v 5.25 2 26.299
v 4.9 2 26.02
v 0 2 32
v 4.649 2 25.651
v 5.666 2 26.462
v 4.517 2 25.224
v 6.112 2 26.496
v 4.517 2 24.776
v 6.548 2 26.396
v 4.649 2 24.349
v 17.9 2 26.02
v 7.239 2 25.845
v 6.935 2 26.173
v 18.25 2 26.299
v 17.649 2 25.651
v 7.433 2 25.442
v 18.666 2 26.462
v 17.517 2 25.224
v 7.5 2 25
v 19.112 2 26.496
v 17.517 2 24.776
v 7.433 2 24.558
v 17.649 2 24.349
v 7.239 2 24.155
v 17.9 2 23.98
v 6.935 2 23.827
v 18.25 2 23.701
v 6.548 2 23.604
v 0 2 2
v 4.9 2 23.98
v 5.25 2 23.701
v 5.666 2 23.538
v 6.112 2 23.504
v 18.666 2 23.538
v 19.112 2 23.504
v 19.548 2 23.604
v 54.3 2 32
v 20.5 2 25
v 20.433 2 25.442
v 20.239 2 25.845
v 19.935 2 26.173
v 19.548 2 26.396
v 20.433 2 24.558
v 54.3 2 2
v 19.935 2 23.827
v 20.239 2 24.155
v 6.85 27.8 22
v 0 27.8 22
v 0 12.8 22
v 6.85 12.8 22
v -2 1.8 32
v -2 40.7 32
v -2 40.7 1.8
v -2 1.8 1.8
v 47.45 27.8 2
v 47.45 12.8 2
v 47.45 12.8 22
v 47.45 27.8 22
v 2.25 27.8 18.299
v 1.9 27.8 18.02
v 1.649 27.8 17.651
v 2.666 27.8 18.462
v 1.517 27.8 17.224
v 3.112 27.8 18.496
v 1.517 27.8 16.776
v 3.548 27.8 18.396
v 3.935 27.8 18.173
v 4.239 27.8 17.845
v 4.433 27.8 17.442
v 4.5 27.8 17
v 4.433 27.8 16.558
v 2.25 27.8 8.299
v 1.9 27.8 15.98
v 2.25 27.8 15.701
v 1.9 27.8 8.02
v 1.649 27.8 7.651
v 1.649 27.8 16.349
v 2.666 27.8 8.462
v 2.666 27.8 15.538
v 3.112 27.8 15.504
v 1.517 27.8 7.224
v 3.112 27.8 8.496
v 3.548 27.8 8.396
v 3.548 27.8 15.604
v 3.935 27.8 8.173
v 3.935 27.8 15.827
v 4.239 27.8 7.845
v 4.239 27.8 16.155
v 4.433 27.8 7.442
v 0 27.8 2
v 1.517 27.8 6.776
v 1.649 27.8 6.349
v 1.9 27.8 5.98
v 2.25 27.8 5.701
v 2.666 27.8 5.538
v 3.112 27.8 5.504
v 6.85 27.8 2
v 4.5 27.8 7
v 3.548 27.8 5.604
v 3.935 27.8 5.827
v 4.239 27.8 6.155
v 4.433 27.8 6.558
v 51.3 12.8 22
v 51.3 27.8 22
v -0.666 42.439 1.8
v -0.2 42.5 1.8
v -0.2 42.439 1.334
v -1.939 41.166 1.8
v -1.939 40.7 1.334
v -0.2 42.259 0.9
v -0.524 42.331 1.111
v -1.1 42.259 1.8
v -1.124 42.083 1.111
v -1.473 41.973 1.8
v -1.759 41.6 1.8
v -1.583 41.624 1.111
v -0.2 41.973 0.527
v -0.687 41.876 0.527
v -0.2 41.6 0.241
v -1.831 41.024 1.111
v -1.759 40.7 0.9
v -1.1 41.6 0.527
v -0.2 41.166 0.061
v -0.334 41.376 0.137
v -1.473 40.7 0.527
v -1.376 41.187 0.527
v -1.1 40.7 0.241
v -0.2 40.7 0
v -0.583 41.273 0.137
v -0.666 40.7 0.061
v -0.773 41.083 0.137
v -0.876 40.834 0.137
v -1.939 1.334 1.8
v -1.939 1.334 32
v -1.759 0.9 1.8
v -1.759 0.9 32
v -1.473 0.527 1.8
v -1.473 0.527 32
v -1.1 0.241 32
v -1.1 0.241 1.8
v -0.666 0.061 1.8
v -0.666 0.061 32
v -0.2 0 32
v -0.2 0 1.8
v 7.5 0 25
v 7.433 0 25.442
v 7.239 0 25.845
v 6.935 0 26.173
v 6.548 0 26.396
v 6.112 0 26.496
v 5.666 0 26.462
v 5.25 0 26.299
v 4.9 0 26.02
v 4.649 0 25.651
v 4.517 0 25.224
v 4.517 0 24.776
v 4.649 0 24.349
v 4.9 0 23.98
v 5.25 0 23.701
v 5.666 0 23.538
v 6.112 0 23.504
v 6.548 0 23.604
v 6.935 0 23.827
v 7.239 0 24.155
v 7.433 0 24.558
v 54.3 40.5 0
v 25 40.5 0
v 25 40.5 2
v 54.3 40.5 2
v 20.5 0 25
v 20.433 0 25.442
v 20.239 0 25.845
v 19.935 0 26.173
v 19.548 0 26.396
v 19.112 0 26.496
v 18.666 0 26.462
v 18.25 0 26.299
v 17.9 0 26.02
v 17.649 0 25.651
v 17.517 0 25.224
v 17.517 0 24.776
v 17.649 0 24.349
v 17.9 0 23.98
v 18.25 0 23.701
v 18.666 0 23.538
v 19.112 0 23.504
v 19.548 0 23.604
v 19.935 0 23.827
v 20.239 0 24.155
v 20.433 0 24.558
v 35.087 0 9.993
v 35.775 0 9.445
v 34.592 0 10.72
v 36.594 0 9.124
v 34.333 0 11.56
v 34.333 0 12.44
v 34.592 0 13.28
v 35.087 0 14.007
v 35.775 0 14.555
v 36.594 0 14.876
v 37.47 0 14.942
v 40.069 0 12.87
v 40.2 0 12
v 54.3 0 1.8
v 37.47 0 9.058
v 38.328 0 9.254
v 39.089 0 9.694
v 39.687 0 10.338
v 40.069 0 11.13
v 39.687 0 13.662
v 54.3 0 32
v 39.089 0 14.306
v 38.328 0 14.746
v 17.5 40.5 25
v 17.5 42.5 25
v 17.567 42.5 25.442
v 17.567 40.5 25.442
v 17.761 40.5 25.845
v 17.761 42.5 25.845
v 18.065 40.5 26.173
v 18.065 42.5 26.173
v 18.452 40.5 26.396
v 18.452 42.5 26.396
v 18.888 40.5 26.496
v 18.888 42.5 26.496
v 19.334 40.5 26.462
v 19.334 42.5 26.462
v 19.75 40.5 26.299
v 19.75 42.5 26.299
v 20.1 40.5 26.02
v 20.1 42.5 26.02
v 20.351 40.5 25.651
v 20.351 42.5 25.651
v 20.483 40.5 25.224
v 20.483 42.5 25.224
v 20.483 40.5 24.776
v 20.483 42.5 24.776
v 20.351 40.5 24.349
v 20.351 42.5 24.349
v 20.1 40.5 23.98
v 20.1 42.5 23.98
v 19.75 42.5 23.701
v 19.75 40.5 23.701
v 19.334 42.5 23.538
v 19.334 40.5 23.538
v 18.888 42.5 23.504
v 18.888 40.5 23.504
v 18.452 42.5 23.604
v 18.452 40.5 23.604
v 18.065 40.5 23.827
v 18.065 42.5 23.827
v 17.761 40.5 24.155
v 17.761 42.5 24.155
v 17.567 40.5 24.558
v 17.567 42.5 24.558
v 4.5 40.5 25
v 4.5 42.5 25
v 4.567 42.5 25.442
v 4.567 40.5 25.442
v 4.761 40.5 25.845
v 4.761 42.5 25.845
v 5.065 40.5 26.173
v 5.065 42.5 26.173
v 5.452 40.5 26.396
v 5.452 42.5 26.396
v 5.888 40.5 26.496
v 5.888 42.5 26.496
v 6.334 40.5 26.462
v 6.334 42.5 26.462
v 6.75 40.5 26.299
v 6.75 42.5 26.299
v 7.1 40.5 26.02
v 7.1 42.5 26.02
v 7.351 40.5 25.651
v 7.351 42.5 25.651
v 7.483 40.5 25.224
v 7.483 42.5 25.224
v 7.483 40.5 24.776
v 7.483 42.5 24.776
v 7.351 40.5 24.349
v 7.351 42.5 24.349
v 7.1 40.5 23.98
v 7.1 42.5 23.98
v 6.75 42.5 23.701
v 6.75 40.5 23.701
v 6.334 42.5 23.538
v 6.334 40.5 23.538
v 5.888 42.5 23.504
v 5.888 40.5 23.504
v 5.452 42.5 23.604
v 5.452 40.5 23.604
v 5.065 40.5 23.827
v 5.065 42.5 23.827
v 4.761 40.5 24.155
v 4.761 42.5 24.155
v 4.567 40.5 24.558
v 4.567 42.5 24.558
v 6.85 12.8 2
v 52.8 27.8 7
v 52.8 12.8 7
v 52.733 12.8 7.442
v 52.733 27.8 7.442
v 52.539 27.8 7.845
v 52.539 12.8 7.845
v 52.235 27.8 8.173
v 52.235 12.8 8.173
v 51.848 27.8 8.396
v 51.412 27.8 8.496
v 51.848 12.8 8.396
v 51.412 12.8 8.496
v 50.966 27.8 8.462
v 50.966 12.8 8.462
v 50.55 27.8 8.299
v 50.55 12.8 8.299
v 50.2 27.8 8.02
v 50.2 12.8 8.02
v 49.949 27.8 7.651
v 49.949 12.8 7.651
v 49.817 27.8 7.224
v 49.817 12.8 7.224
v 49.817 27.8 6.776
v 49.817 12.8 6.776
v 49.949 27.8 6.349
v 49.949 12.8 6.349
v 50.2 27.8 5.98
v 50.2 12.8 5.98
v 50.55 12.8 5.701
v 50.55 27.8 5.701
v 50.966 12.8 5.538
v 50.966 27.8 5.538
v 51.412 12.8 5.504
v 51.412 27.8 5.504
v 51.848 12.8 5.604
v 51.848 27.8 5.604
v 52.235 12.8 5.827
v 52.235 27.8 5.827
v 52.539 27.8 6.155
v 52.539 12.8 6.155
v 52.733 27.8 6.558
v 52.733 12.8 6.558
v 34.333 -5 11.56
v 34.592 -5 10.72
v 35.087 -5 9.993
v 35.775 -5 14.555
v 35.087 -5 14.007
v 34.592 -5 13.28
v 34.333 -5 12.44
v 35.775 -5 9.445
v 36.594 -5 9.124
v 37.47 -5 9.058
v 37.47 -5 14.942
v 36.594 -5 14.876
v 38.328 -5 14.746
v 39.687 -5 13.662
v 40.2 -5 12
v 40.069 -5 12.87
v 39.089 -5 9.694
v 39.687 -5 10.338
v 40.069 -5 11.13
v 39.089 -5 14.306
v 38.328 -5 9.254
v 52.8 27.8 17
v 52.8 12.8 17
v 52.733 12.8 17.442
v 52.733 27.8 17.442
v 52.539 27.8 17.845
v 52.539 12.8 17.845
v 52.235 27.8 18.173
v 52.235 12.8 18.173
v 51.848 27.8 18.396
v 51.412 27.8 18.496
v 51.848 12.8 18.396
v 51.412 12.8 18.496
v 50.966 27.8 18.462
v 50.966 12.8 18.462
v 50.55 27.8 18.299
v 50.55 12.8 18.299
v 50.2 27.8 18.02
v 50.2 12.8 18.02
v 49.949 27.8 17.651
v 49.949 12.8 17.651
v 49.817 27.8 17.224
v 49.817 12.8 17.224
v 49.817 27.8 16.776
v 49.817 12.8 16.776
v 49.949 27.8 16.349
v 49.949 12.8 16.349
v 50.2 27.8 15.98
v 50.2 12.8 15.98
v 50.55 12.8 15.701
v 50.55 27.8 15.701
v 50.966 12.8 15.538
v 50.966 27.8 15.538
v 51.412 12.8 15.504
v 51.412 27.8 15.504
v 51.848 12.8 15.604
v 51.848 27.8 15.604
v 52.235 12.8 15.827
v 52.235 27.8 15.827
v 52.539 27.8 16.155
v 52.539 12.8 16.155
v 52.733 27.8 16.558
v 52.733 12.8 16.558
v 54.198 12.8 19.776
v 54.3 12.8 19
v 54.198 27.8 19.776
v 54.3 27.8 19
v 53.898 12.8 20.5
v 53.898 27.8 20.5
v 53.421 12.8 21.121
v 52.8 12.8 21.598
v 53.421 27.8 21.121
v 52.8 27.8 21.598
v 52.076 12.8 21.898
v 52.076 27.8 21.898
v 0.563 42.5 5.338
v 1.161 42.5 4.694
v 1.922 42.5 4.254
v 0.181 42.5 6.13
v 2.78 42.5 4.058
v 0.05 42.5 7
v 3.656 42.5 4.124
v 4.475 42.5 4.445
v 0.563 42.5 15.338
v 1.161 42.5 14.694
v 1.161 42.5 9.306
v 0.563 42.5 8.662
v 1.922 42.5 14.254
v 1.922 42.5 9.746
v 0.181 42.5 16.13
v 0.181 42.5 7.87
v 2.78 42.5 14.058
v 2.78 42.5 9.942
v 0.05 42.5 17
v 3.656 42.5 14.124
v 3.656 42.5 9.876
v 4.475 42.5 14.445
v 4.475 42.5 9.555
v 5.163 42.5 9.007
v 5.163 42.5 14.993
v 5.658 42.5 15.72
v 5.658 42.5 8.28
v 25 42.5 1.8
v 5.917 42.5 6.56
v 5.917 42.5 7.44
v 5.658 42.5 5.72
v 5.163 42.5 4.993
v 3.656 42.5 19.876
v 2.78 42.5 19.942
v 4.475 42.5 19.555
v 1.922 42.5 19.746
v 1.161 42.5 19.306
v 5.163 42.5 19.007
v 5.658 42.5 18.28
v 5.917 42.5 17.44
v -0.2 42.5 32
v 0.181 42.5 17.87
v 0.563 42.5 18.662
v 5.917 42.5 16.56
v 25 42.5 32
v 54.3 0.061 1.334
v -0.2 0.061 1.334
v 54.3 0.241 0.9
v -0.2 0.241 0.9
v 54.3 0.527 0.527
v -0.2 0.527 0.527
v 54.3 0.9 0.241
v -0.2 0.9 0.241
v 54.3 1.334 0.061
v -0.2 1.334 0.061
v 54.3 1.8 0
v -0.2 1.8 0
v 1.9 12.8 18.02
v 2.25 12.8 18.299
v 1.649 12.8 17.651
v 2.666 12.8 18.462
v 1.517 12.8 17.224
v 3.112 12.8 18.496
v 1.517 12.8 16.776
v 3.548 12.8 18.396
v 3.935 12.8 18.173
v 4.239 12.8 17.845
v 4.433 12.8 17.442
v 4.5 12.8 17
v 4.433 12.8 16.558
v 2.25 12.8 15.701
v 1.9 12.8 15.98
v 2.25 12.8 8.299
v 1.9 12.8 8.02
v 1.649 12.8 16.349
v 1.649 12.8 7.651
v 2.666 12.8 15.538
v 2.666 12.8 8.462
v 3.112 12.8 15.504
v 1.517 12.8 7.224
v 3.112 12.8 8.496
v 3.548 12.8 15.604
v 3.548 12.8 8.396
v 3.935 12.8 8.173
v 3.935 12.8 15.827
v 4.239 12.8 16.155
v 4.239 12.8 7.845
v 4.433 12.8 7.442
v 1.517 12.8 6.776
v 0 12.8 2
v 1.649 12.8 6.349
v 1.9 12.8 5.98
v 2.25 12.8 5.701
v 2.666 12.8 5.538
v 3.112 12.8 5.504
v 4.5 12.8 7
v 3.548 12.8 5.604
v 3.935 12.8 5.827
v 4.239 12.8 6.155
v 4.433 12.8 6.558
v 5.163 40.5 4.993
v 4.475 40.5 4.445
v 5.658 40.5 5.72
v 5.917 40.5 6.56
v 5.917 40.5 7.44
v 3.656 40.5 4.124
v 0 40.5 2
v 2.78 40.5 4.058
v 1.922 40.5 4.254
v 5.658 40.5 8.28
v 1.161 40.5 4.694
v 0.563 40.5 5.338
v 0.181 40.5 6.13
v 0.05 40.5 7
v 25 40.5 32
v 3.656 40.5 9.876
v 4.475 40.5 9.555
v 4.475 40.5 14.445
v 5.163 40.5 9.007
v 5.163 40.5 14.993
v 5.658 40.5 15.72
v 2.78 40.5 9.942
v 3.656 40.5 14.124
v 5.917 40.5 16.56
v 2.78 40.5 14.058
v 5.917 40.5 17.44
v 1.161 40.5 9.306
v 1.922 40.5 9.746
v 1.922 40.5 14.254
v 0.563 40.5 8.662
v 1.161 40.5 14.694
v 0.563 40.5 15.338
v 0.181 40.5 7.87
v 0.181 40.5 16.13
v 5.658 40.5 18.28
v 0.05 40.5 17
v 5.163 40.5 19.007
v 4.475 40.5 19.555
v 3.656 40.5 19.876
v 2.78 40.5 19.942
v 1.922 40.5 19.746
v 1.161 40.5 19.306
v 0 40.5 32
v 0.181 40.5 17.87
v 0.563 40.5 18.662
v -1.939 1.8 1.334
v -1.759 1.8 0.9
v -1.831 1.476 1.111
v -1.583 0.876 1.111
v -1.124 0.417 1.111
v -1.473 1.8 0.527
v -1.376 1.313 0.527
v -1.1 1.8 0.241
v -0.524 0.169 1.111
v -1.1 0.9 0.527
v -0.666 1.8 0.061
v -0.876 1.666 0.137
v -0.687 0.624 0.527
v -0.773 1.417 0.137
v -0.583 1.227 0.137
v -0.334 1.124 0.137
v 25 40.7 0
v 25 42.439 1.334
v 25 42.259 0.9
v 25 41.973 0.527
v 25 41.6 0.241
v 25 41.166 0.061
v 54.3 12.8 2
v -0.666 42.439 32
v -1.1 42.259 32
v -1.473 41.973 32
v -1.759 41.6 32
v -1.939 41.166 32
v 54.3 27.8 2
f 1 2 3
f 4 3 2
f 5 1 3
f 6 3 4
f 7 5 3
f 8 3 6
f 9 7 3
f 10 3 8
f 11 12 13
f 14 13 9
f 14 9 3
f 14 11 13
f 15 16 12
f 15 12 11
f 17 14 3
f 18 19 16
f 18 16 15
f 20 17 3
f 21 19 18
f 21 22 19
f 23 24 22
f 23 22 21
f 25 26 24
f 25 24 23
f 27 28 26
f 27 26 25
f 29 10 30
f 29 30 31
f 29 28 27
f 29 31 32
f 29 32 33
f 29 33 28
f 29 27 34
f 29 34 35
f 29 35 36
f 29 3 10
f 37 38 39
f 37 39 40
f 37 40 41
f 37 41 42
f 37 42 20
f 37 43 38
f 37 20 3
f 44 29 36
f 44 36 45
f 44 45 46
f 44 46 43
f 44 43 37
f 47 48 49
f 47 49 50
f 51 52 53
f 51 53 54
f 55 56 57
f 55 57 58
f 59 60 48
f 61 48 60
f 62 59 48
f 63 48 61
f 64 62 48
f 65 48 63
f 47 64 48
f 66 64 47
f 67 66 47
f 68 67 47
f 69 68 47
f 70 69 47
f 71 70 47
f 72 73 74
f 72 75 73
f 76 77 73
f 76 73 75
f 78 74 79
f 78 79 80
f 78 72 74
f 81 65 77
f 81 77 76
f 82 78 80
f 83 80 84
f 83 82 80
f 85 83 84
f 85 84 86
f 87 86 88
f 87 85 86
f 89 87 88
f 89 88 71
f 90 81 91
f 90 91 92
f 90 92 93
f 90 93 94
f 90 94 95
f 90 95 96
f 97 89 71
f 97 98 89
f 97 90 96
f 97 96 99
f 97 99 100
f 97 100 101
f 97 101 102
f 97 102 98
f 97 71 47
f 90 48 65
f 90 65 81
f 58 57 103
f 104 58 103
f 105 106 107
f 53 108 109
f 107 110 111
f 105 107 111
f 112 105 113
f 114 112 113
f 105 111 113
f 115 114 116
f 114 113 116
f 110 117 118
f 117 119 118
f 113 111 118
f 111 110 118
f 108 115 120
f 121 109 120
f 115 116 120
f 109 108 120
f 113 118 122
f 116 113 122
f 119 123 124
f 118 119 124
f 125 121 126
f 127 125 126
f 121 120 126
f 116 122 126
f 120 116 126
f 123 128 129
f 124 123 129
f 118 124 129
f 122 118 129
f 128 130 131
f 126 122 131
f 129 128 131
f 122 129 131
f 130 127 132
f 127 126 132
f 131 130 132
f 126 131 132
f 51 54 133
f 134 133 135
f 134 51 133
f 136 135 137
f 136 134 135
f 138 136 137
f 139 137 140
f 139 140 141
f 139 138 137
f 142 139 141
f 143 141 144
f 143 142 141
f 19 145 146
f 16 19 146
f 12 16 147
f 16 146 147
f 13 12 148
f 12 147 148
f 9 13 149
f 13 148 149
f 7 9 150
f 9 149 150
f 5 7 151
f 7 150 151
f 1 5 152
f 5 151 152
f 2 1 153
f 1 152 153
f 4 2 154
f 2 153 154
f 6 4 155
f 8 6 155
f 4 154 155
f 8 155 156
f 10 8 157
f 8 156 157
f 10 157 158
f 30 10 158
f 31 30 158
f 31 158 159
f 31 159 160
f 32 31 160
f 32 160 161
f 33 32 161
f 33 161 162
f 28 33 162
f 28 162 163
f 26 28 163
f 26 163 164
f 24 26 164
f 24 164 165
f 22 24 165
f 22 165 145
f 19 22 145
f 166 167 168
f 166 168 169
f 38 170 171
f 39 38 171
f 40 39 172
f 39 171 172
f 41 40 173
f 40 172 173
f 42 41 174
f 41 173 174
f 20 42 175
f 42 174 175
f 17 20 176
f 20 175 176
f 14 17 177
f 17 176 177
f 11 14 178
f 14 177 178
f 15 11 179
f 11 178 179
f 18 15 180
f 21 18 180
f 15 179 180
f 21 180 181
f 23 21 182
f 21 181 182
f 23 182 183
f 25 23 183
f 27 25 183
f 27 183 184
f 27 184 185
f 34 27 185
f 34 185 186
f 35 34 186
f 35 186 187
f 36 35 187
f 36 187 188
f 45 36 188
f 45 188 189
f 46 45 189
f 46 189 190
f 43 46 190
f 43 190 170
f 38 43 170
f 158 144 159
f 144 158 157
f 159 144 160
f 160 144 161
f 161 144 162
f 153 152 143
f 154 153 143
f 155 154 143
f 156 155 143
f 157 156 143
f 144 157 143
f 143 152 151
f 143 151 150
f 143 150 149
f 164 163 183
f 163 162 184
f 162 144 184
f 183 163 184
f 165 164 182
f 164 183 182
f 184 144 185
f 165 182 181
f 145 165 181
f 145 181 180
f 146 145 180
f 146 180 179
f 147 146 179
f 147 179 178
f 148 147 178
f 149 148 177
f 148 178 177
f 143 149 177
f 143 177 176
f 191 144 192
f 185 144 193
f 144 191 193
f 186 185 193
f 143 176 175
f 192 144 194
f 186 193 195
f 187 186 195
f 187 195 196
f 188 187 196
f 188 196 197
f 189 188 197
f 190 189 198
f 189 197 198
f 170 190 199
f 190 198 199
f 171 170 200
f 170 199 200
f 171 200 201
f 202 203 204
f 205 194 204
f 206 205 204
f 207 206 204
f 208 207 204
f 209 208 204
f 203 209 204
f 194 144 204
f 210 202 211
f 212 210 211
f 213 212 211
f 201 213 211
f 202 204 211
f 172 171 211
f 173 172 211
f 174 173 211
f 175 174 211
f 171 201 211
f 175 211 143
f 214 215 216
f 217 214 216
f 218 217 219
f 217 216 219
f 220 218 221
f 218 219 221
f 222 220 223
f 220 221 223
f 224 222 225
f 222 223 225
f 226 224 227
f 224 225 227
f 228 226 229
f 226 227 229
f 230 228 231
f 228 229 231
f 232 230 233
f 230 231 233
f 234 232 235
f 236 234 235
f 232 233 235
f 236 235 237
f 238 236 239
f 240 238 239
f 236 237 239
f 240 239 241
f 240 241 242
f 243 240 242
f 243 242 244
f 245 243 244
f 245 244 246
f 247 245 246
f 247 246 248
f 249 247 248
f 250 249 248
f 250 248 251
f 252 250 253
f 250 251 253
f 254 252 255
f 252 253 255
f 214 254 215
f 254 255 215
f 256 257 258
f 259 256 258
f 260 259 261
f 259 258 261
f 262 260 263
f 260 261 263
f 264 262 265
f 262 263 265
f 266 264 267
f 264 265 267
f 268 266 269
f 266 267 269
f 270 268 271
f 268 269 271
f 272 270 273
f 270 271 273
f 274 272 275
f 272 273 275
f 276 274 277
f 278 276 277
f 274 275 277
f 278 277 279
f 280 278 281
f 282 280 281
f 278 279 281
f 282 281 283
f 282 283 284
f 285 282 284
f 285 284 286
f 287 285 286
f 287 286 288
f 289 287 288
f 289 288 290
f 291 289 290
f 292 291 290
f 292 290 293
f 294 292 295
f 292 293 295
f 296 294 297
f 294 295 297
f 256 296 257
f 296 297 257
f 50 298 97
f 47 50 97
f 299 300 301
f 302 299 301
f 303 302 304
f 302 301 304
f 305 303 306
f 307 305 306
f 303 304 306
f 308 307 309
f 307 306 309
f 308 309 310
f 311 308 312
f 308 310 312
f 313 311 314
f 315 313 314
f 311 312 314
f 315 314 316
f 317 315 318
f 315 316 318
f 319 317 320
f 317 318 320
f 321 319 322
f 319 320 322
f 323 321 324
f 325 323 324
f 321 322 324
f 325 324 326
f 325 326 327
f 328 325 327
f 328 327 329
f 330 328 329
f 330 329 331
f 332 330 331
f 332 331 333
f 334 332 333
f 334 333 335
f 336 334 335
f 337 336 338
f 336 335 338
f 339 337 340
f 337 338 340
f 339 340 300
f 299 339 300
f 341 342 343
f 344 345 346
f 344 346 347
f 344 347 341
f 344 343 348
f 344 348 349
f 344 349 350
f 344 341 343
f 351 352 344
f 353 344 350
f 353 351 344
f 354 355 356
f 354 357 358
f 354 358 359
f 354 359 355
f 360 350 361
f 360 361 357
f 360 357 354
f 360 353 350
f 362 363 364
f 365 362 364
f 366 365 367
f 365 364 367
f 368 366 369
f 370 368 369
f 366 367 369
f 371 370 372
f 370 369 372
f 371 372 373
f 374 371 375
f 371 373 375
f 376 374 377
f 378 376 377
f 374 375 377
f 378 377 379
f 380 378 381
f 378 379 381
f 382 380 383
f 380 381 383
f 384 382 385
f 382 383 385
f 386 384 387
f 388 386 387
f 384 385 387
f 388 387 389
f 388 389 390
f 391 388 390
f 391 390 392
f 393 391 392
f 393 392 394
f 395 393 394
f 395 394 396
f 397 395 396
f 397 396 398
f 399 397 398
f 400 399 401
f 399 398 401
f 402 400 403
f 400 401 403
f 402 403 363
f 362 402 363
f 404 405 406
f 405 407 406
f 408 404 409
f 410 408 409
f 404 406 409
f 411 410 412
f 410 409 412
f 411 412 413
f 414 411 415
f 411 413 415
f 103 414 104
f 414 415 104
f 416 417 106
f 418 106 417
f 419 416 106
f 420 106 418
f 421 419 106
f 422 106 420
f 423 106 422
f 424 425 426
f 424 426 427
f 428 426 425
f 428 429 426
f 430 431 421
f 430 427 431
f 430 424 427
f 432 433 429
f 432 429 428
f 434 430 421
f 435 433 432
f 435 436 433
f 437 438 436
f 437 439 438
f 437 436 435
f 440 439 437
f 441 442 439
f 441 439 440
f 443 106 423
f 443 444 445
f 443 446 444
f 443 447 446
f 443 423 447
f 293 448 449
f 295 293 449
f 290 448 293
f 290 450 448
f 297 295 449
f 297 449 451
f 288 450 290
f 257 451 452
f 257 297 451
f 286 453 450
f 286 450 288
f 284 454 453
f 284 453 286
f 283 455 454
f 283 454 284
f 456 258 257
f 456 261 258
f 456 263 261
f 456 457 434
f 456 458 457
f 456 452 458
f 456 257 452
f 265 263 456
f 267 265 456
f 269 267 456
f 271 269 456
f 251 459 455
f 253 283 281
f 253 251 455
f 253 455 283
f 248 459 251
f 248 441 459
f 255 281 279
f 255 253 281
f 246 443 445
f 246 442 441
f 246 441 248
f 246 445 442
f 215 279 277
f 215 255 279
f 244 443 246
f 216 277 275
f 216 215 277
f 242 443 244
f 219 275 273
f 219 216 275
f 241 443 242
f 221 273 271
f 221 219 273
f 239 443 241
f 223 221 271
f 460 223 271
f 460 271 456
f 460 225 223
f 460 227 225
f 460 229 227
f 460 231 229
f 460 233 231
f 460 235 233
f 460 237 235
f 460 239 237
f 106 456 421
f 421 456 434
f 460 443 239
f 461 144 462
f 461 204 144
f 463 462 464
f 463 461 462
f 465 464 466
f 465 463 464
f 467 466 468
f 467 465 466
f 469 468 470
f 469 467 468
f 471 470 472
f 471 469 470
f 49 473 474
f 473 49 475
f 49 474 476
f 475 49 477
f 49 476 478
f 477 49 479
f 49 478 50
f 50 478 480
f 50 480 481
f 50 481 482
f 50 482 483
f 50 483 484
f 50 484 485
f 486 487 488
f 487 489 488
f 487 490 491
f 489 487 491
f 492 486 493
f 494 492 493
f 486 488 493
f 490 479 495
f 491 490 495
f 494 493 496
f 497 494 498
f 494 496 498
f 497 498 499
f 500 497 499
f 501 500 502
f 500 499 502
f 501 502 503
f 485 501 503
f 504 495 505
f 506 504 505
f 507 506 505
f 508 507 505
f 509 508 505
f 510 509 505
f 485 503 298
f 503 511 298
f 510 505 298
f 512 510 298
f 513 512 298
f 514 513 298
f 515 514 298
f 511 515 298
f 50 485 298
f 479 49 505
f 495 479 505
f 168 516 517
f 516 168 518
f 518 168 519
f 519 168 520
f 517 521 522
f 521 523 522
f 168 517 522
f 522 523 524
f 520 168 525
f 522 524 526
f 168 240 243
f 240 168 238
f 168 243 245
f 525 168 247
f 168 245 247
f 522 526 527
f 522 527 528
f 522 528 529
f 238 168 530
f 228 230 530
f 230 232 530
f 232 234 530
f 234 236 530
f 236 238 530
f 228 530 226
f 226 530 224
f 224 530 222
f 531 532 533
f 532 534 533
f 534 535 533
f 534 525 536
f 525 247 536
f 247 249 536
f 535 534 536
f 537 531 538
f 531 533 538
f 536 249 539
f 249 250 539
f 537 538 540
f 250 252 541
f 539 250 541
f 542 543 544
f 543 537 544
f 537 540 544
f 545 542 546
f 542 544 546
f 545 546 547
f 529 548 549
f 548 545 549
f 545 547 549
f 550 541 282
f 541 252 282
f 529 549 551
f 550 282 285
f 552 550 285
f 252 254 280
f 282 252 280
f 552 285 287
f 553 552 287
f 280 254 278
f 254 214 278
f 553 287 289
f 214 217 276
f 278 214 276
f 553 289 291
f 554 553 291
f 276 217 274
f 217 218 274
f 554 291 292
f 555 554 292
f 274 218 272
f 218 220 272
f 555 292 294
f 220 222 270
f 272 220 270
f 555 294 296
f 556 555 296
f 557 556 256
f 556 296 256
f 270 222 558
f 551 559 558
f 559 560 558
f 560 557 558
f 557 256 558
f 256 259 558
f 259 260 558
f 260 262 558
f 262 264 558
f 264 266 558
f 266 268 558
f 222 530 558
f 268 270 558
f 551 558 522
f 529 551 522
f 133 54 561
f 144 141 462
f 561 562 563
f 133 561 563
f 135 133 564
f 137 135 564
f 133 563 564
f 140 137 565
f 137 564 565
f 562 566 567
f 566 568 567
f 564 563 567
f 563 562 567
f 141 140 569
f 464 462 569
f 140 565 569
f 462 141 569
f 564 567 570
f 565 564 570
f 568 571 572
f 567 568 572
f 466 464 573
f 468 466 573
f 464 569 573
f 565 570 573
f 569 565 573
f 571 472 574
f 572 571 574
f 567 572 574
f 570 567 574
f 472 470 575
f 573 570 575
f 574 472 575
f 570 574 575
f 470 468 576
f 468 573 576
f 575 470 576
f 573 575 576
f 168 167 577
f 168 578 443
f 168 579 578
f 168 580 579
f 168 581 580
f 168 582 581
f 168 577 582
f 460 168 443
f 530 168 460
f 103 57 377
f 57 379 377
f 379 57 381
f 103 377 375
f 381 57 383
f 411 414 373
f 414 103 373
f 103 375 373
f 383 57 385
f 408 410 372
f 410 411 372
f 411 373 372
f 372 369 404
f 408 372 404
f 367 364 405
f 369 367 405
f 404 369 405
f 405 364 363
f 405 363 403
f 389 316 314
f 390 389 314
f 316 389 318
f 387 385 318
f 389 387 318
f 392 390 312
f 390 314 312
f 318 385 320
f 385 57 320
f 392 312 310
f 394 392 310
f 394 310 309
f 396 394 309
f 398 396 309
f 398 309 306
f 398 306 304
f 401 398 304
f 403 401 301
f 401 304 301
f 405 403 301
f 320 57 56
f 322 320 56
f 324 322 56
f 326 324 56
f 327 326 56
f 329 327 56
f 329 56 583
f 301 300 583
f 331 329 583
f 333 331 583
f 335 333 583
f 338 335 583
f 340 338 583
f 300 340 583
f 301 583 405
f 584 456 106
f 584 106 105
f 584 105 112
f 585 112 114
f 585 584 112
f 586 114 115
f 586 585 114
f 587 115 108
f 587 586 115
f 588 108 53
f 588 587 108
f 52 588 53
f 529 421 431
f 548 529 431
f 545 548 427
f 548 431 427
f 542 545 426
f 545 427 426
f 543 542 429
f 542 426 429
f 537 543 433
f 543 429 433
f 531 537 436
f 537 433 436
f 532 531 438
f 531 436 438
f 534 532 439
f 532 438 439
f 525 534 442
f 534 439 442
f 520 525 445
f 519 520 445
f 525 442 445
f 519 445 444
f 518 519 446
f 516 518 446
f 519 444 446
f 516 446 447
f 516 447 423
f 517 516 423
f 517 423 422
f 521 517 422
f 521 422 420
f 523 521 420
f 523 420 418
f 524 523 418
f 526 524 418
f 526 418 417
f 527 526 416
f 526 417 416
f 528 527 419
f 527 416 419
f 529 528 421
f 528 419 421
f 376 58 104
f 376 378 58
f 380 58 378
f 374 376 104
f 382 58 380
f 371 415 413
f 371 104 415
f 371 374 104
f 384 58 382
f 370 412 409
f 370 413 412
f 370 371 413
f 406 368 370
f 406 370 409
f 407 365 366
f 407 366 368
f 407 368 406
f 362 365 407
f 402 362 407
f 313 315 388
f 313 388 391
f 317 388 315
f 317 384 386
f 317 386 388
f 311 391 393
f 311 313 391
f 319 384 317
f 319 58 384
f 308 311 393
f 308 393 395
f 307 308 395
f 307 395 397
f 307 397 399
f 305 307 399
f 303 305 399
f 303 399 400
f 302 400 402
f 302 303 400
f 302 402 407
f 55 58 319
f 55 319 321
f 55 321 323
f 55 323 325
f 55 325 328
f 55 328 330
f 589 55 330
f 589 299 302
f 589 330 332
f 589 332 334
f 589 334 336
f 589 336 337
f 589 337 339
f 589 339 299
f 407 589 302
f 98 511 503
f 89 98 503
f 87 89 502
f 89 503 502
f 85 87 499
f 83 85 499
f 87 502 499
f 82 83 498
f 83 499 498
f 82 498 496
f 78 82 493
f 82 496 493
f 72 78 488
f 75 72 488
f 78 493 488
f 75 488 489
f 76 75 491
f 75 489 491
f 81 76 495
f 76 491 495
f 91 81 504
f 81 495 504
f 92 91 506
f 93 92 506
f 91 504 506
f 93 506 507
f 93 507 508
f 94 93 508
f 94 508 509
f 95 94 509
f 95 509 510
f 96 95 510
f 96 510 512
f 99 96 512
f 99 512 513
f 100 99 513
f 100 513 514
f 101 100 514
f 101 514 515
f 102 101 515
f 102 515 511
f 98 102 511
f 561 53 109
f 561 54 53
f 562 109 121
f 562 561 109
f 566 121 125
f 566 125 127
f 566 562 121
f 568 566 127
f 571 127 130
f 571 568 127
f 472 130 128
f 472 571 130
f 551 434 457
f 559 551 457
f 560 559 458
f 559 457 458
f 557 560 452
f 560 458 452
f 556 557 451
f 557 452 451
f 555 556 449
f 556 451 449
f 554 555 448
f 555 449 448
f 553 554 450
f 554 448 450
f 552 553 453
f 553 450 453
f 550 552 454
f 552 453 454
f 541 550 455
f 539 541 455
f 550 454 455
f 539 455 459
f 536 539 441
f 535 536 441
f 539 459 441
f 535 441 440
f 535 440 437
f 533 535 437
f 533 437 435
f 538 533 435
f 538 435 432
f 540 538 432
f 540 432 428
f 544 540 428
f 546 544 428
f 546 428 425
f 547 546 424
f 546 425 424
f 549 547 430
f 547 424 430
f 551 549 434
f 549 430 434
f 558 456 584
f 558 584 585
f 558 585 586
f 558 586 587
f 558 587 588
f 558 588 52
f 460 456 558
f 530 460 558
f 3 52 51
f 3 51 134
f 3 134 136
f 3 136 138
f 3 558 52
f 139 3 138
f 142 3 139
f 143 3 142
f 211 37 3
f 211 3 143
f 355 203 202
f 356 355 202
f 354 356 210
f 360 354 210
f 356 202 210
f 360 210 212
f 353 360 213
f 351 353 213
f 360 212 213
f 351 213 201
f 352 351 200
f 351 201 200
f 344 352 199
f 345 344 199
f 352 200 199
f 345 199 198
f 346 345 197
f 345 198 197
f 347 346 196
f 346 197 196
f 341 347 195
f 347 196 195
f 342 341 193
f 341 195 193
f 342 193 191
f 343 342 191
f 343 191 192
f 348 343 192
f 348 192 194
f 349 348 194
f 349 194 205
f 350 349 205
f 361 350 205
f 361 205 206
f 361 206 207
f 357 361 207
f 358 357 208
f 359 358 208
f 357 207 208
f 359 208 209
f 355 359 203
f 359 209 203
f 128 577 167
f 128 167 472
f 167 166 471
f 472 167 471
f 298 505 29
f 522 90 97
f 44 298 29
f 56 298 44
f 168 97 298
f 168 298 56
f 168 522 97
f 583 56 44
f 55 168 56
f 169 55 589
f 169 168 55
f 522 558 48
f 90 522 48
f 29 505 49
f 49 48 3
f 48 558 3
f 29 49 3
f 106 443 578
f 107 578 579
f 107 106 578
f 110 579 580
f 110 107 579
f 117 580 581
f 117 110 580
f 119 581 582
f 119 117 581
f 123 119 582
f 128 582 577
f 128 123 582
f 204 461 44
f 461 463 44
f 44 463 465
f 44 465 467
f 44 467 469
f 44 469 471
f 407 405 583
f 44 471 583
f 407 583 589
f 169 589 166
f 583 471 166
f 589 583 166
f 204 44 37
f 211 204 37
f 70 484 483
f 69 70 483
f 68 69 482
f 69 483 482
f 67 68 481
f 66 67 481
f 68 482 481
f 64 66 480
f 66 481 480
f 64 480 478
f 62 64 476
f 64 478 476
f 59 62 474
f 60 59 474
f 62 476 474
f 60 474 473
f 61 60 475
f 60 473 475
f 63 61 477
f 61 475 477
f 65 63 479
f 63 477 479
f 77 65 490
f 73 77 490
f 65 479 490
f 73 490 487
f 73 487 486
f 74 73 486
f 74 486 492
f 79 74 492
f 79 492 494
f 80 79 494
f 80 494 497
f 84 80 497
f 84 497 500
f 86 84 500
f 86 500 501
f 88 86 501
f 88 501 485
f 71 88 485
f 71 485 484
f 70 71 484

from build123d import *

# Parameters (mm, degrees)
SKETCH_W        = 54.3
SKETCH_H        = 38.5
PAD_DEPTH       = 2
SKETCH003_W     = 6.85
SKETCH003_H     = 15
PAD001_DEPTH    = 20
SKETCH001_W     = 54.3
SKETCH001_H     = 2
PAD003_DEPTH    = 32
SKETCH005_W     = 6.85
SKETCH005_H     = 15
PAD004_DEPTH    = 20
SKETCH002_R     = 2.95
PAD005_DEPTH    = 5
SKETCH007_W     = 25
SKETCH007_H     = 32
PAD006_DEPTH    = 2
SKETCH006_R     = 1.5
POCKET_DEPTH    = 15
SKETCH004_R     = 1.5
POCKET001_DEPTH = 20
SKETCH009_R     = 1.5
SKETCH009_R_2   = 2.95
POCKET002_DEPTH = 2
SKETCH008_R     = 1.5
POCKET003_DEPTH = 3
SKETCH010_W     = 42.5
SKETCH010_H     = 32
PAD007_DEPTH    = 2
FILLET_R        = 1.8
FILLET001_R     = 1.8
FILLET002_R     = 1.8
FILLET003_R     = 3


with BuildPart() as part:
    # Sketch → Pad (new body)
    with BuildSketch(Plane.XY):
        with Locations((27.15, 21.25)):
            Rectangle(SKETCH_W, SKETCH_H)
    extrude(amount=PAD_DEPTH)

    # Sketch003 → Pad001 (join)
    with BuildSketch(Plane.XY.offset(2)):
        with Locations((3.425, 20.3)):
            Rectangle(SKETCH003_W, SKETCH003_H)
    extrude(amount=PAD001_DEPTH)

    # Sketch001 → Pad003 (join)
    with BuildSketch(Plane.XY):
        with Locations((27.15, 1)):
            Rectangle(SKETCH001_W, SKETCH001_H)
    extrude(amount=PAD003_DEPTH)

    # Sketch005 (on Face5 of Pad003) → Pad004 (join)
    with BuildSketch(Plane.XY.offset(2)):
        with Locations((50.875, 20.3)):
            Rectangle(SKETCH005_W, SKETCH005_H)
    extrude(amount=PAD004_DEPTH)

    # Sketch002 (on Face18 of Pad004) → Pad005 (join)
    with BuildSketch(Plane.XZ):
        with Locations((37.25, 12)):
            Circle(SKETCH002_R)
    extrude(amount=PAD005_DEPTH)

    # Sketch007 (on Face1 of Pad005) → Pad006 (join)
    with BuildSketch(Plane(origin=(0, 40.5, 0), x_dir=(-1, 0, 0), z_dir=(0, 1, 0))):
        with Locations((-12.5, 16)):
            Rectangle(SKETCH007_W, SKETCH007_H)
    extrude(amount=PAD006_DEPTH)

    # Sketch006 (on Face14 of Pad006) → Pocket (cut)
    with BuildSketch(Plane.XZ.offset(-12.8)):
        with Locations((51.3, 17)):
            Circle(SKETCH006_R)
        with Locations((51.3, 7)):
            Circle(SKETCH006_R)
    extrude(amount=-POCKET_DEPTH, mode=Mode.SUBTRACT)

    # Sketch004 (on Face16 of Pocket) → Pocket001 (cut)
    with BuildSketch(Plane.XZ.offset(-12.8)):
        with Locations((3, 17)):
            Circle(SKETCH004_R)
        with Locations((3, 7)):
            Circle(SKETCH004_R)
    extrude(amount=-POCKET001_DEPTH, mode=Mode.SUBTRACT)

    # Sketch009 (on Face20 of Pocket001) → Pocket002 (cut)
    with BuildSketch(Plane(origin=(0, 42.5, 0), x_dir=(-1, 0, 0), z_dir=(0, 1, 0))):
        with Locations((-6, 25)):
            Circle(SKETCH009_R)
        with Locations((-19, 25)):
            Circle(SKETCH009_R)
        with Locations((-3, 7)):
            Circle(SKETCH009_R_2)
        with Locations((-3, 17)):
            Circle(SKETCH009_R_2)
    extrude(amount=-POCKET002_DEPTH, mode=Mode.SUBTRACT)

    # Sketch008 → Pocket003 (cut)
    with BuildSketch(Plane.XZ):
        with Locations((19, 25)):
            Circle(SKETCH008_R)
        with Locations((6, 25)):
            Circle(SKETCH008_R)
    extrude(amount=-POCKET003_DEPTH, mode=Mode.SUBTRACT)

    # Sketch010 (on Face8 of Pocket003) → Pad007 (join)
    with BuildSketch(Plane(origin=(0, 0, 0), x_dir=(0, -1, 0), z_dir=(-1, 0, 0))):
        with Locations((-21.25, 16)):
            Rectangle(SKETCH010_W, SKETCH010_H)
    extrude(amount=PAD007_DEPTH)

    # Fillet
    fillet_edges = [part.edges().sort_by_distance(p)[0] for p in [
        (-2, 42.5, 16),
    ]]
    fillet(fillet_edges, radius=FILLET_R)

    # Fillet001
    fillet001_edges = [part.edges().sort_by_distance(p)[0] for p in [
        (-2, 0, 16),
    ]]
    fillet(fillet001_edges, radius=FILLET001_R)

    # Fillet002
    fillet002_edges = [part.edges().sort_by_distance(p)[0] for p in [
        (-2, 21.25, 0),
    ]]
    fillet(fillet002_edges, radius=FILLET002_R)

    # Fillet003
    fillet003_edges = [part.edges().sort_by_distance(p)[0] for p in [
        (54.3, 20.3, 22),
    ]]
    fillet(fillet003_edges, radius=FILLET003_R)


solid = part.part
